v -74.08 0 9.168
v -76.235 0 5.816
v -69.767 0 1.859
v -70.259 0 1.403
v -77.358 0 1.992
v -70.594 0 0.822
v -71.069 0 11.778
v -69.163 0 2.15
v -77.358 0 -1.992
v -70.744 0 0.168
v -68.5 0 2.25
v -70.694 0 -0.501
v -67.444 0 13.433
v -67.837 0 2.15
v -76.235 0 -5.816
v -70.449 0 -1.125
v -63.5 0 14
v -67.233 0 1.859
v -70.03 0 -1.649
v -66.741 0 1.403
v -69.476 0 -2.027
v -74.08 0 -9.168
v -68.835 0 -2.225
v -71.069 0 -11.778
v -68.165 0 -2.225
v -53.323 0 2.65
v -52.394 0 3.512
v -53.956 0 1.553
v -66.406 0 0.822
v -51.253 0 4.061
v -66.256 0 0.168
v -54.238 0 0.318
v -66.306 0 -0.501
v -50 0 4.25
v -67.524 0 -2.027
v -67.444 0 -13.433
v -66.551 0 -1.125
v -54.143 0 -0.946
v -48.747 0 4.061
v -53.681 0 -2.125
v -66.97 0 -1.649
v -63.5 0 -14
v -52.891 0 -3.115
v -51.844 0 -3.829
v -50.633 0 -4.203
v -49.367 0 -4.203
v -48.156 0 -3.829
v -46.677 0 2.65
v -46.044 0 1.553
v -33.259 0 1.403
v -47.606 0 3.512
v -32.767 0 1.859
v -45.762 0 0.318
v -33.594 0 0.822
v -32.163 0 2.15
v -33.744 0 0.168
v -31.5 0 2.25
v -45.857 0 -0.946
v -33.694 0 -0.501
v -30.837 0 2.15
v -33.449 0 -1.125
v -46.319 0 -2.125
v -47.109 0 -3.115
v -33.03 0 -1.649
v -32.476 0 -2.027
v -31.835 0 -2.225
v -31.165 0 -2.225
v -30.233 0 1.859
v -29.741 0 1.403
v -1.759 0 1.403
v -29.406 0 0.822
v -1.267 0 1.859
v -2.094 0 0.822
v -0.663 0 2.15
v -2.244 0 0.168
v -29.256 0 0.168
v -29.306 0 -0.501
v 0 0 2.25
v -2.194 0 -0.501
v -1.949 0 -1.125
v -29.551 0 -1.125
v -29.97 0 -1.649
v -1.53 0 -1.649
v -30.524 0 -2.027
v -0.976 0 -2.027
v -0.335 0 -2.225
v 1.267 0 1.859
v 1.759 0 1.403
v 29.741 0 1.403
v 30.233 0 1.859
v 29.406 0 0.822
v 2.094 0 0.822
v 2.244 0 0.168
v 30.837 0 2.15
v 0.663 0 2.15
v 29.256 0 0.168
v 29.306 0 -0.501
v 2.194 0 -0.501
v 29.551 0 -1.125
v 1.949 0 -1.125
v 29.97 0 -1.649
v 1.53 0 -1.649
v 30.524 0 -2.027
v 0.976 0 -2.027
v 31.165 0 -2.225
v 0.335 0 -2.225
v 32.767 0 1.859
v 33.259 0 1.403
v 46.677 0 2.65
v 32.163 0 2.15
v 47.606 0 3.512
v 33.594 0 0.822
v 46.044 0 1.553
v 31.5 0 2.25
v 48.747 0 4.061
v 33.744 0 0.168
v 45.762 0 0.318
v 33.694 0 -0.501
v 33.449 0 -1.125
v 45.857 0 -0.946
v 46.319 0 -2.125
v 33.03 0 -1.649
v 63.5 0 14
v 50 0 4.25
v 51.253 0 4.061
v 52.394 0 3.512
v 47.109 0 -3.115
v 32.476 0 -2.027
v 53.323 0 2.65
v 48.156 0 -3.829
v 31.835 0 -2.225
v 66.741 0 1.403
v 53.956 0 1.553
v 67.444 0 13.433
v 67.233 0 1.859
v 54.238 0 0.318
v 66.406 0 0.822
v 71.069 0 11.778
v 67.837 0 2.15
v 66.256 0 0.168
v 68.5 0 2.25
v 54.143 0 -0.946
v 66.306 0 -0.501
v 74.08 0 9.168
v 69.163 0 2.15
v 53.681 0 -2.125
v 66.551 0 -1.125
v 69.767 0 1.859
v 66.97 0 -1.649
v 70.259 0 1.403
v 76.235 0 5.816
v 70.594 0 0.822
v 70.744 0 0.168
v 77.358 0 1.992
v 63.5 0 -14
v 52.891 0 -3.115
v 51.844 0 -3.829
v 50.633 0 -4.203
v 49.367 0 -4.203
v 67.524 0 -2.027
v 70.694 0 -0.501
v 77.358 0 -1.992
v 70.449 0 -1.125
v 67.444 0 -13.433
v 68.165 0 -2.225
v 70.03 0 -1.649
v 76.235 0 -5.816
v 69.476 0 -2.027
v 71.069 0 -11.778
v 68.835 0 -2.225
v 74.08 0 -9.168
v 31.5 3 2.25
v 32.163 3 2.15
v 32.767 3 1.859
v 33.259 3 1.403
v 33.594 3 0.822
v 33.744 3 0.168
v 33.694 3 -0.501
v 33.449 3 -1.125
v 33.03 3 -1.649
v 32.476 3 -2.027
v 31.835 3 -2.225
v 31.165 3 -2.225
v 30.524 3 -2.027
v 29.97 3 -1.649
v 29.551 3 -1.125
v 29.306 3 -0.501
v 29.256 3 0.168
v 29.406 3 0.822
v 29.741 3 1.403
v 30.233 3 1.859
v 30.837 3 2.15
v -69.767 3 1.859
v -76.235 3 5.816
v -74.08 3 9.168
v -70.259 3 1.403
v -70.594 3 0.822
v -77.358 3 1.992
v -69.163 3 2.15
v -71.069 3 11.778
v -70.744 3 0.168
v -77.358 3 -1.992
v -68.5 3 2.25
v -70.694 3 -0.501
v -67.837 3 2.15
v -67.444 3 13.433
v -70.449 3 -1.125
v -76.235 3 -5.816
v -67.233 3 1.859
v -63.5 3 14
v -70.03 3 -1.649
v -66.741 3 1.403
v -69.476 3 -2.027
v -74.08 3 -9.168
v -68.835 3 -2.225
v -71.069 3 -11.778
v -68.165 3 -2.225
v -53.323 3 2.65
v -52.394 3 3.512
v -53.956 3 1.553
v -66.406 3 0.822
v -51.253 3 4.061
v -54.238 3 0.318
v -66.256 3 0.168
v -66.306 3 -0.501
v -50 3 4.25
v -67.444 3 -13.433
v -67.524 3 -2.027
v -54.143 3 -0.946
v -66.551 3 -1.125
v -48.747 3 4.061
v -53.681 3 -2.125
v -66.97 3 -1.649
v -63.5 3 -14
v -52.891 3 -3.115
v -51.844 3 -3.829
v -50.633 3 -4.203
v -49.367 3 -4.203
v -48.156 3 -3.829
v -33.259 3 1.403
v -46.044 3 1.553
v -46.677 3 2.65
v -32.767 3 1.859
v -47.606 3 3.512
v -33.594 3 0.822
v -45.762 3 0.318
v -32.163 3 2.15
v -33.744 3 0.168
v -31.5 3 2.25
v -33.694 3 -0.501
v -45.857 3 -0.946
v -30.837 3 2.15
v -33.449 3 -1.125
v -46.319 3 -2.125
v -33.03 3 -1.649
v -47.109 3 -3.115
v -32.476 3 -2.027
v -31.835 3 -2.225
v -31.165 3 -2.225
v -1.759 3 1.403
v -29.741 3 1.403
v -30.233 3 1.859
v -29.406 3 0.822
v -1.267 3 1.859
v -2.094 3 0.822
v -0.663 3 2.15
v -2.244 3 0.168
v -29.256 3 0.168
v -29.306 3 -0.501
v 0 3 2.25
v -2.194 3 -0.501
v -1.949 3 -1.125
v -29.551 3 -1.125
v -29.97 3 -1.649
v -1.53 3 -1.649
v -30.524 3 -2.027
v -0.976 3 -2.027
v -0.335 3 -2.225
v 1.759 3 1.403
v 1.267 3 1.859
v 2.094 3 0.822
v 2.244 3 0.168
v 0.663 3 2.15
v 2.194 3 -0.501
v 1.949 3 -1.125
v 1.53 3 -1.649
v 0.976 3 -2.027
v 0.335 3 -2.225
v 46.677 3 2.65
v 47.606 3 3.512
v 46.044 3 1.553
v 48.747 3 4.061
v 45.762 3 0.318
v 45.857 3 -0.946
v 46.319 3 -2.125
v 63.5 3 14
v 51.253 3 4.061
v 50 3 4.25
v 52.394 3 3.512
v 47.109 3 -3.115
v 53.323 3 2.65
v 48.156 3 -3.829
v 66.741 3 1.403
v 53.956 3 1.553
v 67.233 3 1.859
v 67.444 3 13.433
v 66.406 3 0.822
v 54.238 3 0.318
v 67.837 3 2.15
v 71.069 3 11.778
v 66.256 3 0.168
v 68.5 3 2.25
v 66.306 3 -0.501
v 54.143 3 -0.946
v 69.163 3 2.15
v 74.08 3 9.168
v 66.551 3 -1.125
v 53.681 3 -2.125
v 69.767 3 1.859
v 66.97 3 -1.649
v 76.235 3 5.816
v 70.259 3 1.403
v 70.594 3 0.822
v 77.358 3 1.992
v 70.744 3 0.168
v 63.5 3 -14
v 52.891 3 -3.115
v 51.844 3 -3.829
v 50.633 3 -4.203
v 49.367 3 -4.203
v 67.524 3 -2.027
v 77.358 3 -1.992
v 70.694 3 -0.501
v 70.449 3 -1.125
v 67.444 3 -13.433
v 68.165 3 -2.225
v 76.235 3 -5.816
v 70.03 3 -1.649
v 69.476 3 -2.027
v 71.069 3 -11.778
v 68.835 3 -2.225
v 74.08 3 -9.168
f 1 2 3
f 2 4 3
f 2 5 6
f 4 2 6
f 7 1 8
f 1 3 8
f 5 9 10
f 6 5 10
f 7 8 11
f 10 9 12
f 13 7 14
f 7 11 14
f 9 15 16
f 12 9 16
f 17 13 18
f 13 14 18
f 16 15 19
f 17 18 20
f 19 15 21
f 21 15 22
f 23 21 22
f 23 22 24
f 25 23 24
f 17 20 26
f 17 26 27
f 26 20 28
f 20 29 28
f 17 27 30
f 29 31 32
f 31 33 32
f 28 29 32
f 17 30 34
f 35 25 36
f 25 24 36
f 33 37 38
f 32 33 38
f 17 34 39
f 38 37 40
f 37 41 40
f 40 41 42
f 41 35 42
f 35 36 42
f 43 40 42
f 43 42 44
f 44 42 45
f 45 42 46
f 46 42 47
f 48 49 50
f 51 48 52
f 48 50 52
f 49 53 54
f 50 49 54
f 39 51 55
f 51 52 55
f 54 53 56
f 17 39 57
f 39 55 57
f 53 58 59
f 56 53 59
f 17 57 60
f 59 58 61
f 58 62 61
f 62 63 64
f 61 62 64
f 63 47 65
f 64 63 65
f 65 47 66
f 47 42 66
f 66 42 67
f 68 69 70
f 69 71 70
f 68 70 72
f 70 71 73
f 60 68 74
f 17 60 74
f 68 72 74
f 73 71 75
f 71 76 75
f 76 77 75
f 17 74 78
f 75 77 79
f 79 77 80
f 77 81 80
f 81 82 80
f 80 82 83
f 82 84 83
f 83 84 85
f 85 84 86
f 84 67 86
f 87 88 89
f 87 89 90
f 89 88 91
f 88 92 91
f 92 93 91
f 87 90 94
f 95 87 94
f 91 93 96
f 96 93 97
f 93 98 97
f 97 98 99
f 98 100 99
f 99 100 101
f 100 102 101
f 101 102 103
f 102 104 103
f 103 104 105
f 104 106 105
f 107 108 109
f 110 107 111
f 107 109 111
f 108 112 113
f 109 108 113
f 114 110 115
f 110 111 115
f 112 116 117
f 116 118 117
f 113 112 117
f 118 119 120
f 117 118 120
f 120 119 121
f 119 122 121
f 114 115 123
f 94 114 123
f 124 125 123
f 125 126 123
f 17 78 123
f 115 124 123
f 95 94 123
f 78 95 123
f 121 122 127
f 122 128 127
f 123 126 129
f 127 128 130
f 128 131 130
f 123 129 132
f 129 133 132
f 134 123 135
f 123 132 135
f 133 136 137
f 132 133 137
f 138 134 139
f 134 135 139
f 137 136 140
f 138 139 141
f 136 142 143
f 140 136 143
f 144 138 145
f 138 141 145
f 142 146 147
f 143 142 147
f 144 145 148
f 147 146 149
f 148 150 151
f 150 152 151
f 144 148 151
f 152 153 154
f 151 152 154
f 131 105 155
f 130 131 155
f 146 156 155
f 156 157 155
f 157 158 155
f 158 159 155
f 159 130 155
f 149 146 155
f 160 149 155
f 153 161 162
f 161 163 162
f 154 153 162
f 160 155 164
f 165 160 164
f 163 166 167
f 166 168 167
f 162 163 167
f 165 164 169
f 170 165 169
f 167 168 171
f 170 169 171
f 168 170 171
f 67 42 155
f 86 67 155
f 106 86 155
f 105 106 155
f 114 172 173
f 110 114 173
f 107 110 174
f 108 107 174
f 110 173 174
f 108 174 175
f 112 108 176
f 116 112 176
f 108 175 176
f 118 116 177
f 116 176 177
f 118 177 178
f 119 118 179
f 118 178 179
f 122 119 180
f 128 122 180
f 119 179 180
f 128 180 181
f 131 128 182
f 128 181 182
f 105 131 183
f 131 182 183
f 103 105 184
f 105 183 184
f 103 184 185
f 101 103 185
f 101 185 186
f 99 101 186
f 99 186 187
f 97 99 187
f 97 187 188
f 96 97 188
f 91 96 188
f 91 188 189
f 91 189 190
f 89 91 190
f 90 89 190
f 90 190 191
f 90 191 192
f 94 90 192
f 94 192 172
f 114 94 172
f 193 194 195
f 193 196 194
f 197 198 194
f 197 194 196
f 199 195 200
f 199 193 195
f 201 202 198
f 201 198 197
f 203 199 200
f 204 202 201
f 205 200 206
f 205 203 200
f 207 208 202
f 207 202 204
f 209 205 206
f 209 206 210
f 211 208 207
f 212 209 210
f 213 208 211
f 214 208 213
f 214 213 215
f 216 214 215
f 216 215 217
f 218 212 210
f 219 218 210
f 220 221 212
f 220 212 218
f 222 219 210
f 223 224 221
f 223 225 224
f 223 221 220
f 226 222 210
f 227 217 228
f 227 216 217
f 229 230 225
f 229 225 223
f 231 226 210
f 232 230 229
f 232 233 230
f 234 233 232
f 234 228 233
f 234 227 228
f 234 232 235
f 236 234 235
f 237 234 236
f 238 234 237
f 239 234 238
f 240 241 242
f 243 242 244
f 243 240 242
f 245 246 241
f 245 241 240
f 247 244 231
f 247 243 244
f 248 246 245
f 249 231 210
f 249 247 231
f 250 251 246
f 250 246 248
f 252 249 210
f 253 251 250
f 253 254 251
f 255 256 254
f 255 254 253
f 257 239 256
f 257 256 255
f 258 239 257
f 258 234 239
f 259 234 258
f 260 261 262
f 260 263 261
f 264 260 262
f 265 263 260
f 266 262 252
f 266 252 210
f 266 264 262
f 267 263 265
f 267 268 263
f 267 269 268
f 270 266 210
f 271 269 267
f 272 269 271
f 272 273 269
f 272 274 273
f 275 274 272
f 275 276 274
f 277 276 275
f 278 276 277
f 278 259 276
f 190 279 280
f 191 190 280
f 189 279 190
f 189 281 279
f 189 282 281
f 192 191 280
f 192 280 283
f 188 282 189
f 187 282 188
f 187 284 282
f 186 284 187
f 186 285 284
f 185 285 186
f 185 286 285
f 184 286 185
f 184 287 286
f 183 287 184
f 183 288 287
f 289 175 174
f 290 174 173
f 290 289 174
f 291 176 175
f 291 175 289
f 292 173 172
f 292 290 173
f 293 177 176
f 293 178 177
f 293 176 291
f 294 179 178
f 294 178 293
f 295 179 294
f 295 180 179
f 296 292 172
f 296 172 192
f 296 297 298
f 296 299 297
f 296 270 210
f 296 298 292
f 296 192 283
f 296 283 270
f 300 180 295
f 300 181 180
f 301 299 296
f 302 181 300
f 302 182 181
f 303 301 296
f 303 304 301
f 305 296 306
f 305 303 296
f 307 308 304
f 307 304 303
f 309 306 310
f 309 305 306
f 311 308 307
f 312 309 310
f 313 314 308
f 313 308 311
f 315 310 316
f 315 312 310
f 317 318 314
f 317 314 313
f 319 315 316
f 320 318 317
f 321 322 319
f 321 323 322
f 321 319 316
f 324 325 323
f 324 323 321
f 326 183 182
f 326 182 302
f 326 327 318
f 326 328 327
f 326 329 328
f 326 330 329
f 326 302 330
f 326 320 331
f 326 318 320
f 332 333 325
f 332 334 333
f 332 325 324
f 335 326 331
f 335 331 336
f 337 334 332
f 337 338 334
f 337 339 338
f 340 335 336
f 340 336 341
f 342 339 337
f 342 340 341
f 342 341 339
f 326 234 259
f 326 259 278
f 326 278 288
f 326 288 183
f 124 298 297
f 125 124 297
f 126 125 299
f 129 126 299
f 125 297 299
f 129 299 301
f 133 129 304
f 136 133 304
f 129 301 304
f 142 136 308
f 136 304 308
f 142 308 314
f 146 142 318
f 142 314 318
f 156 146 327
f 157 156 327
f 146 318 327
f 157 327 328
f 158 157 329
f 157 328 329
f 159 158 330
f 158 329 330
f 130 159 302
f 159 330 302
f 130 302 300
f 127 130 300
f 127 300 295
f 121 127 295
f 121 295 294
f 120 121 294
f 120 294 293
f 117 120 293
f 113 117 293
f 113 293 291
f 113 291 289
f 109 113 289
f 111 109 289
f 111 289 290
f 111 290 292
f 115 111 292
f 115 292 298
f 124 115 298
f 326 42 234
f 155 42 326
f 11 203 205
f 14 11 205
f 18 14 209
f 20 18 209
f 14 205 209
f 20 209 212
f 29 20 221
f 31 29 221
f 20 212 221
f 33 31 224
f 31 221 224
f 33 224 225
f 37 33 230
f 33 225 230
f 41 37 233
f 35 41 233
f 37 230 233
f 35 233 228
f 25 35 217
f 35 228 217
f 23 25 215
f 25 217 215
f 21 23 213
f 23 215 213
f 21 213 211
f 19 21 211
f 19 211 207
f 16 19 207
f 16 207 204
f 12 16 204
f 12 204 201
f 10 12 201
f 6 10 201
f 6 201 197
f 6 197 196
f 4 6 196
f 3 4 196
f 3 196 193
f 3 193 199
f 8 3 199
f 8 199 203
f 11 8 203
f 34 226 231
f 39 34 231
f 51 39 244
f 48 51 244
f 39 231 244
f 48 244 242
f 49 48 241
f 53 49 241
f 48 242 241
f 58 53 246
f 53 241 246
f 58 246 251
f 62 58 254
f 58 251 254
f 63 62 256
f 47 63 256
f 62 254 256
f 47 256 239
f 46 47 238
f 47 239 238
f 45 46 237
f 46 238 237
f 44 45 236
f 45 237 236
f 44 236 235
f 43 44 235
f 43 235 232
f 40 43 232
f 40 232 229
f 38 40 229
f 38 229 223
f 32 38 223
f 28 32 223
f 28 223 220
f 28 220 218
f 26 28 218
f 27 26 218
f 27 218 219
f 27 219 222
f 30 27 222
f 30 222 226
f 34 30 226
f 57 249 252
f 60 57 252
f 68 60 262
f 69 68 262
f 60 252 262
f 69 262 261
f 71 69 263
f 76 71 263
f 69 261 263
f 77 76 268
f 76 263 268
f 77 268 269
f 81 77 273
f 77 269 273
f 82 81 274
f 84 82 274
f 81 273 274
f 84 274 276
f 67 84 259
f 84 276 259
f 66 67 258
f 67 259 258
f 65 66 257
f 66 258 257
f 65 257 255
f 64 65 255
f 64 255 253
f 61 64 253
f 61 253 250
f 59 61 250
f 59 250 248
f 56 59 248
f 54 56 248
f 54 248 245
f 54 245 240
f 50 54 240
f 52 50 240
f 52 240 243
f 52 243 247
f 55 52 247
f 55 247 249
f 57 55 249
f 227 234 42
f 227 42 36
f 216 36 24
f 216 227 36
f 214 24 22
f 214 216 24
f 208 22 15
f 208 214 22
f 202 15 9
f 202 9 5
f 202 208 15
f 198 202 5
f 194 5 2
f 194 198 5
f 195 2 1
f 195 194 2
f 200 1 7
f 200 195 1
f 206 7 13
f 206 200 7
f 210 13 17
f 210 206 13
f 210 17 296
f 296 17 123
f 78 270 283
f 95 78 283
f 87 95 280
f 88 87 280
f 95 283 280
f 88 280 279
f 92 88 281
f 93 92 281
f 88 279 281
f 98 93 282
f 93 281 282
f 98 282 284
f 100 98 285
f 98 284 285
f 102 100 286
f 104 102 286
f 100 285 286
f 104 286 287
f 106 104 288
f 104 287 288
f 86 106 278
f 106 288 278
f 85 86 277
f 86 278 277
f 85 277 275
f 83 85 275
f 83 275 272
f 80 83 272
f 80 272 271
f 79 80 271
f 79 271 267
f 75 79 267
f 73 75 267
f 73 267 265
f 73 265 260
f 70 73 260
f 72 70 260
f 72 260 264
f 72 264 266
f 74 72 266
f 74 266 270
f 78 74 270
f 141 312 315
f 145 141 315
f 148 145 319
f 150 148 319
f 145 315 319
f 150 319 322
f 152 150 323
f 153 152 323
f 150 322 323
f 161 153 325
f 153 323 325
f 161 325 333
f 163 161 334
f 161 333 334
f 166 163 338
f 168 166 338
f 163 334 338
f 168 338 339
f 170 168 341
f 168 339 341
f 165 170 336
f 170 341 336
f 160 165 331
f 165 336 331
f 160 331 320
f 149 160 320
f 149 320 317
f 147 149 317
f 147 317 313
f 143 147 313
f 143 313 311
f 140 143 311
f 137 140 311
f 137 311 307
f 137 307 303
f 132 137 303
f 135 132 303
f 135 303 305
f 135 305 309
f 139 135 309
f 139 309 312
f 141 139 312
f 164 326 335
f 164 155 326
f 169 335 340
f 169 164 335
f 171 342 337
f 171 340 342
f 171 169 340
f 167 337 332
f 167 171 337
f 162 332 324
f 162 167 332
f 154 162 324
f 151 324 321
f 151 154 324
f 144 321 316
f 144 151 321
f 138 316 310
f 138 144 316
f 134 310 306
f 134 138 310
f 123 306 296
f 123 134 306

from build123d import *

# Parameters (mm, degrees)
SKETCH_1_W          = 155
SKETCH_1_H          = 28
EXTRUDE_1_DEPTH     = 3
CUT_EXTRUDE_1_REACH = 80.811
SKETCH_2_R          = 4.25
SKETCH_2_R_2        = 2.25
FILLET_1_RADIUS     = 14
FILLET_1_LENGTH     = 3
CUT_EXTRUDE_2_REACH = 80.811
SKETCH_3_R          = 2.25
FILLET_2_RADIUS     = 14
FILLET_2_LENGTH     = 3


with BuildPart() as part:
    # 草图1 → 凸台-拉伸1 (new body)
    with BuildSketch(Plane(origin=(0, 0, 0), x_dir=(1, 0, 0), z_dir=(0, 1, 0))):
        Rectangle(SKETCH_1_W, SKETCH_1_H)
    extrude(amount=EXTRUDE_1_DEPTH)

    # 草图2 → 切除-拉伸1 (cut, up to next)
    with BuildSketch(Plane(origin=(0, 3, 0), x_dir=(1, 0, 0), z_dir=(0, 1, 0)), mode=Mode.PRIVATE) as cut_extrude_1_sk1:
        with Locations(Location((-50, 0, 0), (0, 0, 270))):
            Circle(SKETCH_2_R)
    cut_extrude_1_tool1 = extrude(cut_extrude_1_sk1.sketch, amount=-CUT_EXTRUDE_1_REACH, mode=Mode.PRIVATE) & part.part
    # 草图2 → 切除-拉伸1 (cut, up to next)
    with BuildSketch(Plane(origin=(0, 3, 0), x_dir=(1, 0, 0), z_dir=(0, 1, 0)), mode=Mode.PRIVATE) as cut_extrude_1_sk2:
        with Locations(Location((50, 0, 0), (0, 0, 270))):
            Circle(SKETCH_2_R)
    cut_extrude_1_tool2 = extrude(cut_extrude_1_sk2.sketch, amount=-CUT_EXTRUDE_1_REACH, mode=Mode.PRIVATE) & part.part
    # 草图2 → 切除-拉伸1 (cut, up to next)
    with BuildSketch(Plane(origin=(0, 3, 0), x_dir=(1, 0, 0), z_dir=(0, 1, 0)), mode=Mode.PRIVATE) as cut_extrude_1_sk3:
        with Locations(Location((0, 0, 0), (0, 0, 270))):
            Circle(SKETCH_2_R_2)
    cut_extrude_1_tool3 = extrude(cut_extrude_1_sk3.sketch, amount=-CUT_EXTRUDE_1_REACH, mode=Mode.PRIVATE) & part.part
    add(cut_extrude_1_tool1.solids().sort_by_distance((-50, 3, 0))[0], mode=Mode.SUBTRACT)
    add(cut_extrude_1_tool2.solids().sort_by_distance((50, 3, 0))[0], mode=Mode.SUBTRACT)
    add(cut_extrude_1_tool3.solids().sort_by_distance((0, 3, 0))[0], mode=Mode.SUBTRACT)

    # 圆角1: full round fillet: the end face becomes a half cylinder, R = half its width
    fillet_1_face = Plane((-77.5, 1.5, 0), x_dir=(0, 1, 0), z_dir=(-1, 0, 0))  # on the end face: x along it, z out of the body
    fillet_1_slab = fillet_1_face.offset(-FILLET_1_RADIUS / 2) * Box(FILLET_1_LENGTH, 2 * FILLET_1_RADIUS, FILLET_1_RADIUS, mode=Mode.PRIVATE)  # the body's end, R deep
    fillet_1_round = Plane((-63.5, 1.5, 0), x_dir=(-1, 0, 0), z_dir=(0, 1, 0)) * Cylinder(FILLET_1_RADIUS, FILLET_1_LENGTH, mode=Mode.PRIVATE)  # its axis R under the face
    add(fillet_1_slab - fillet_1_round, mode=Mode.SUBTRACT)

    # 草图3 → 切除-拉伸2 (cut, up to next)
    with BuildSketch(Plane(origin=(0, 3, 0), x_dir=(1, 0, 0), z_dir=(0, 1, 0)), mode=Mode.PRIVATE) as cut_extrude_2_sk1:
        with Locations(Location((-68.5, 0, 0), (0, 0, 270))):
            Circle(SKETCH_3_R)
    cut_extrude_2_tool1 = extrude(cut_extrude_2_sk1.sketch, amount=-CUT_EXTRUDE_2_REACH, mode=Mode.PRIVATE) & part.part
    # 草图3 → 切除-拉伸2 (cut, up to next)
    with BuildSketch(Plane(origin=(0, 3, 0), x_dir=(1, 0, 0), z_dir=(0, 1, 0)), mode=Mode.PRIVATE) as cut_extrude_2_sk2:
        with Locations(Location((-31.5, 0, 0), (0, 0, 270))):
            Circle(SKETCH_3_R)
    cut_extrude_2_tool2 = extrude(cut_extrude_2_sk2.sketch, amount=-CUT_EXTRUDE_2_REACH, mode=Mode.PRIVATE) & part.part
    # 草图3 → 切除-拉伸2 (cut, up to next)
    with BuildSketch(Plane(origin=(0, 3, 0), x_dir=(1, 0, 0), z_dir=(0, 1, 0)), mode=Mode.PRIVATE) as cut_extrude_2_sk3:
        with Locations(Location((31.5, 0, 0), (0, 0, 270))):
            Circle(SKETCH_3_R)
    cut_extrude_2_tool3 = extrude(cut_extrude_2_sk3.sketch, amount=-CUT_EXTRUDE_2_REACH, mode=Mode.PRIVATE) & part.part
    # 草图3 → 切除-拉伸2 (cut, up to next)
    with BuildSketch(Plane(origin=(0, 3, 0), x_dir=(1, 0, 0), z_dir=(0, 1, 0)), mode=Mode.PRIVATE) as cut_extrude_2_sk4:
        with Locations(Location((68.5, 0, 0), (0, 0, 270))):
            Circle(SKETCH_3_R)
    cut_extrude_2_tool4 = extrude(cut_extrude_2_sk4.sketch, amount=-CUT_EXTRUDE_2_REACH, mode=Mode.PRIVATE) & part.part
    add(cut_extrude_2_tool1.solids().sort_by_distance((-68.5, 3, 0))[0], mode=Mode.SUBTRACT)
    add(cut_extrude_2_tool2.solids().sort_by_distance((-31.5, 3, 0))[0], mode=Mode.SUBTRACT)
    add(cut_extrude_2_tool3.solids().sort_by_distance((31.5, 3, 0))[0], mode=Mode.SUBTRACT)
    add(cut_extrude_2_tool4.solids().sort_by_distance((68.5, 3, 0))[0], mode=Mode.SUBTRACT)

    # 圆角2: full round fillet: the end face becomes a half cylinder, R = half its width
    fillet_2_face = Plane((77.5, 1.5, 0), x_dir=(0, -1, 0), z_dir=(1, 0, 0))  # on the end face: x along it, z out of the body
    fillet_2_slab = fillet_2_face.offset(-FILLET_2_RADIUS / 2) * Box(FILLET_2_LENGTH, 2 * FILLET_2_RADIUS, FILLET_2_RADIUS, mode=Mode.PRIVATE)  # the body's end, R deep
    fillet_2_round = Plane((63.5, 1.5, 0), x_dir=(1, 0, 0), z_dir=(0, -1, 0)) * Cylinder(FILLET_2_RADIUS, FILLET_2_LENGTH, mode=Mode.PRIVATE)  # its axis R under the face
    add(fillet_2_slab - fillet_2_round, mode=Mode.SUBTRACT)


solid = part.part
